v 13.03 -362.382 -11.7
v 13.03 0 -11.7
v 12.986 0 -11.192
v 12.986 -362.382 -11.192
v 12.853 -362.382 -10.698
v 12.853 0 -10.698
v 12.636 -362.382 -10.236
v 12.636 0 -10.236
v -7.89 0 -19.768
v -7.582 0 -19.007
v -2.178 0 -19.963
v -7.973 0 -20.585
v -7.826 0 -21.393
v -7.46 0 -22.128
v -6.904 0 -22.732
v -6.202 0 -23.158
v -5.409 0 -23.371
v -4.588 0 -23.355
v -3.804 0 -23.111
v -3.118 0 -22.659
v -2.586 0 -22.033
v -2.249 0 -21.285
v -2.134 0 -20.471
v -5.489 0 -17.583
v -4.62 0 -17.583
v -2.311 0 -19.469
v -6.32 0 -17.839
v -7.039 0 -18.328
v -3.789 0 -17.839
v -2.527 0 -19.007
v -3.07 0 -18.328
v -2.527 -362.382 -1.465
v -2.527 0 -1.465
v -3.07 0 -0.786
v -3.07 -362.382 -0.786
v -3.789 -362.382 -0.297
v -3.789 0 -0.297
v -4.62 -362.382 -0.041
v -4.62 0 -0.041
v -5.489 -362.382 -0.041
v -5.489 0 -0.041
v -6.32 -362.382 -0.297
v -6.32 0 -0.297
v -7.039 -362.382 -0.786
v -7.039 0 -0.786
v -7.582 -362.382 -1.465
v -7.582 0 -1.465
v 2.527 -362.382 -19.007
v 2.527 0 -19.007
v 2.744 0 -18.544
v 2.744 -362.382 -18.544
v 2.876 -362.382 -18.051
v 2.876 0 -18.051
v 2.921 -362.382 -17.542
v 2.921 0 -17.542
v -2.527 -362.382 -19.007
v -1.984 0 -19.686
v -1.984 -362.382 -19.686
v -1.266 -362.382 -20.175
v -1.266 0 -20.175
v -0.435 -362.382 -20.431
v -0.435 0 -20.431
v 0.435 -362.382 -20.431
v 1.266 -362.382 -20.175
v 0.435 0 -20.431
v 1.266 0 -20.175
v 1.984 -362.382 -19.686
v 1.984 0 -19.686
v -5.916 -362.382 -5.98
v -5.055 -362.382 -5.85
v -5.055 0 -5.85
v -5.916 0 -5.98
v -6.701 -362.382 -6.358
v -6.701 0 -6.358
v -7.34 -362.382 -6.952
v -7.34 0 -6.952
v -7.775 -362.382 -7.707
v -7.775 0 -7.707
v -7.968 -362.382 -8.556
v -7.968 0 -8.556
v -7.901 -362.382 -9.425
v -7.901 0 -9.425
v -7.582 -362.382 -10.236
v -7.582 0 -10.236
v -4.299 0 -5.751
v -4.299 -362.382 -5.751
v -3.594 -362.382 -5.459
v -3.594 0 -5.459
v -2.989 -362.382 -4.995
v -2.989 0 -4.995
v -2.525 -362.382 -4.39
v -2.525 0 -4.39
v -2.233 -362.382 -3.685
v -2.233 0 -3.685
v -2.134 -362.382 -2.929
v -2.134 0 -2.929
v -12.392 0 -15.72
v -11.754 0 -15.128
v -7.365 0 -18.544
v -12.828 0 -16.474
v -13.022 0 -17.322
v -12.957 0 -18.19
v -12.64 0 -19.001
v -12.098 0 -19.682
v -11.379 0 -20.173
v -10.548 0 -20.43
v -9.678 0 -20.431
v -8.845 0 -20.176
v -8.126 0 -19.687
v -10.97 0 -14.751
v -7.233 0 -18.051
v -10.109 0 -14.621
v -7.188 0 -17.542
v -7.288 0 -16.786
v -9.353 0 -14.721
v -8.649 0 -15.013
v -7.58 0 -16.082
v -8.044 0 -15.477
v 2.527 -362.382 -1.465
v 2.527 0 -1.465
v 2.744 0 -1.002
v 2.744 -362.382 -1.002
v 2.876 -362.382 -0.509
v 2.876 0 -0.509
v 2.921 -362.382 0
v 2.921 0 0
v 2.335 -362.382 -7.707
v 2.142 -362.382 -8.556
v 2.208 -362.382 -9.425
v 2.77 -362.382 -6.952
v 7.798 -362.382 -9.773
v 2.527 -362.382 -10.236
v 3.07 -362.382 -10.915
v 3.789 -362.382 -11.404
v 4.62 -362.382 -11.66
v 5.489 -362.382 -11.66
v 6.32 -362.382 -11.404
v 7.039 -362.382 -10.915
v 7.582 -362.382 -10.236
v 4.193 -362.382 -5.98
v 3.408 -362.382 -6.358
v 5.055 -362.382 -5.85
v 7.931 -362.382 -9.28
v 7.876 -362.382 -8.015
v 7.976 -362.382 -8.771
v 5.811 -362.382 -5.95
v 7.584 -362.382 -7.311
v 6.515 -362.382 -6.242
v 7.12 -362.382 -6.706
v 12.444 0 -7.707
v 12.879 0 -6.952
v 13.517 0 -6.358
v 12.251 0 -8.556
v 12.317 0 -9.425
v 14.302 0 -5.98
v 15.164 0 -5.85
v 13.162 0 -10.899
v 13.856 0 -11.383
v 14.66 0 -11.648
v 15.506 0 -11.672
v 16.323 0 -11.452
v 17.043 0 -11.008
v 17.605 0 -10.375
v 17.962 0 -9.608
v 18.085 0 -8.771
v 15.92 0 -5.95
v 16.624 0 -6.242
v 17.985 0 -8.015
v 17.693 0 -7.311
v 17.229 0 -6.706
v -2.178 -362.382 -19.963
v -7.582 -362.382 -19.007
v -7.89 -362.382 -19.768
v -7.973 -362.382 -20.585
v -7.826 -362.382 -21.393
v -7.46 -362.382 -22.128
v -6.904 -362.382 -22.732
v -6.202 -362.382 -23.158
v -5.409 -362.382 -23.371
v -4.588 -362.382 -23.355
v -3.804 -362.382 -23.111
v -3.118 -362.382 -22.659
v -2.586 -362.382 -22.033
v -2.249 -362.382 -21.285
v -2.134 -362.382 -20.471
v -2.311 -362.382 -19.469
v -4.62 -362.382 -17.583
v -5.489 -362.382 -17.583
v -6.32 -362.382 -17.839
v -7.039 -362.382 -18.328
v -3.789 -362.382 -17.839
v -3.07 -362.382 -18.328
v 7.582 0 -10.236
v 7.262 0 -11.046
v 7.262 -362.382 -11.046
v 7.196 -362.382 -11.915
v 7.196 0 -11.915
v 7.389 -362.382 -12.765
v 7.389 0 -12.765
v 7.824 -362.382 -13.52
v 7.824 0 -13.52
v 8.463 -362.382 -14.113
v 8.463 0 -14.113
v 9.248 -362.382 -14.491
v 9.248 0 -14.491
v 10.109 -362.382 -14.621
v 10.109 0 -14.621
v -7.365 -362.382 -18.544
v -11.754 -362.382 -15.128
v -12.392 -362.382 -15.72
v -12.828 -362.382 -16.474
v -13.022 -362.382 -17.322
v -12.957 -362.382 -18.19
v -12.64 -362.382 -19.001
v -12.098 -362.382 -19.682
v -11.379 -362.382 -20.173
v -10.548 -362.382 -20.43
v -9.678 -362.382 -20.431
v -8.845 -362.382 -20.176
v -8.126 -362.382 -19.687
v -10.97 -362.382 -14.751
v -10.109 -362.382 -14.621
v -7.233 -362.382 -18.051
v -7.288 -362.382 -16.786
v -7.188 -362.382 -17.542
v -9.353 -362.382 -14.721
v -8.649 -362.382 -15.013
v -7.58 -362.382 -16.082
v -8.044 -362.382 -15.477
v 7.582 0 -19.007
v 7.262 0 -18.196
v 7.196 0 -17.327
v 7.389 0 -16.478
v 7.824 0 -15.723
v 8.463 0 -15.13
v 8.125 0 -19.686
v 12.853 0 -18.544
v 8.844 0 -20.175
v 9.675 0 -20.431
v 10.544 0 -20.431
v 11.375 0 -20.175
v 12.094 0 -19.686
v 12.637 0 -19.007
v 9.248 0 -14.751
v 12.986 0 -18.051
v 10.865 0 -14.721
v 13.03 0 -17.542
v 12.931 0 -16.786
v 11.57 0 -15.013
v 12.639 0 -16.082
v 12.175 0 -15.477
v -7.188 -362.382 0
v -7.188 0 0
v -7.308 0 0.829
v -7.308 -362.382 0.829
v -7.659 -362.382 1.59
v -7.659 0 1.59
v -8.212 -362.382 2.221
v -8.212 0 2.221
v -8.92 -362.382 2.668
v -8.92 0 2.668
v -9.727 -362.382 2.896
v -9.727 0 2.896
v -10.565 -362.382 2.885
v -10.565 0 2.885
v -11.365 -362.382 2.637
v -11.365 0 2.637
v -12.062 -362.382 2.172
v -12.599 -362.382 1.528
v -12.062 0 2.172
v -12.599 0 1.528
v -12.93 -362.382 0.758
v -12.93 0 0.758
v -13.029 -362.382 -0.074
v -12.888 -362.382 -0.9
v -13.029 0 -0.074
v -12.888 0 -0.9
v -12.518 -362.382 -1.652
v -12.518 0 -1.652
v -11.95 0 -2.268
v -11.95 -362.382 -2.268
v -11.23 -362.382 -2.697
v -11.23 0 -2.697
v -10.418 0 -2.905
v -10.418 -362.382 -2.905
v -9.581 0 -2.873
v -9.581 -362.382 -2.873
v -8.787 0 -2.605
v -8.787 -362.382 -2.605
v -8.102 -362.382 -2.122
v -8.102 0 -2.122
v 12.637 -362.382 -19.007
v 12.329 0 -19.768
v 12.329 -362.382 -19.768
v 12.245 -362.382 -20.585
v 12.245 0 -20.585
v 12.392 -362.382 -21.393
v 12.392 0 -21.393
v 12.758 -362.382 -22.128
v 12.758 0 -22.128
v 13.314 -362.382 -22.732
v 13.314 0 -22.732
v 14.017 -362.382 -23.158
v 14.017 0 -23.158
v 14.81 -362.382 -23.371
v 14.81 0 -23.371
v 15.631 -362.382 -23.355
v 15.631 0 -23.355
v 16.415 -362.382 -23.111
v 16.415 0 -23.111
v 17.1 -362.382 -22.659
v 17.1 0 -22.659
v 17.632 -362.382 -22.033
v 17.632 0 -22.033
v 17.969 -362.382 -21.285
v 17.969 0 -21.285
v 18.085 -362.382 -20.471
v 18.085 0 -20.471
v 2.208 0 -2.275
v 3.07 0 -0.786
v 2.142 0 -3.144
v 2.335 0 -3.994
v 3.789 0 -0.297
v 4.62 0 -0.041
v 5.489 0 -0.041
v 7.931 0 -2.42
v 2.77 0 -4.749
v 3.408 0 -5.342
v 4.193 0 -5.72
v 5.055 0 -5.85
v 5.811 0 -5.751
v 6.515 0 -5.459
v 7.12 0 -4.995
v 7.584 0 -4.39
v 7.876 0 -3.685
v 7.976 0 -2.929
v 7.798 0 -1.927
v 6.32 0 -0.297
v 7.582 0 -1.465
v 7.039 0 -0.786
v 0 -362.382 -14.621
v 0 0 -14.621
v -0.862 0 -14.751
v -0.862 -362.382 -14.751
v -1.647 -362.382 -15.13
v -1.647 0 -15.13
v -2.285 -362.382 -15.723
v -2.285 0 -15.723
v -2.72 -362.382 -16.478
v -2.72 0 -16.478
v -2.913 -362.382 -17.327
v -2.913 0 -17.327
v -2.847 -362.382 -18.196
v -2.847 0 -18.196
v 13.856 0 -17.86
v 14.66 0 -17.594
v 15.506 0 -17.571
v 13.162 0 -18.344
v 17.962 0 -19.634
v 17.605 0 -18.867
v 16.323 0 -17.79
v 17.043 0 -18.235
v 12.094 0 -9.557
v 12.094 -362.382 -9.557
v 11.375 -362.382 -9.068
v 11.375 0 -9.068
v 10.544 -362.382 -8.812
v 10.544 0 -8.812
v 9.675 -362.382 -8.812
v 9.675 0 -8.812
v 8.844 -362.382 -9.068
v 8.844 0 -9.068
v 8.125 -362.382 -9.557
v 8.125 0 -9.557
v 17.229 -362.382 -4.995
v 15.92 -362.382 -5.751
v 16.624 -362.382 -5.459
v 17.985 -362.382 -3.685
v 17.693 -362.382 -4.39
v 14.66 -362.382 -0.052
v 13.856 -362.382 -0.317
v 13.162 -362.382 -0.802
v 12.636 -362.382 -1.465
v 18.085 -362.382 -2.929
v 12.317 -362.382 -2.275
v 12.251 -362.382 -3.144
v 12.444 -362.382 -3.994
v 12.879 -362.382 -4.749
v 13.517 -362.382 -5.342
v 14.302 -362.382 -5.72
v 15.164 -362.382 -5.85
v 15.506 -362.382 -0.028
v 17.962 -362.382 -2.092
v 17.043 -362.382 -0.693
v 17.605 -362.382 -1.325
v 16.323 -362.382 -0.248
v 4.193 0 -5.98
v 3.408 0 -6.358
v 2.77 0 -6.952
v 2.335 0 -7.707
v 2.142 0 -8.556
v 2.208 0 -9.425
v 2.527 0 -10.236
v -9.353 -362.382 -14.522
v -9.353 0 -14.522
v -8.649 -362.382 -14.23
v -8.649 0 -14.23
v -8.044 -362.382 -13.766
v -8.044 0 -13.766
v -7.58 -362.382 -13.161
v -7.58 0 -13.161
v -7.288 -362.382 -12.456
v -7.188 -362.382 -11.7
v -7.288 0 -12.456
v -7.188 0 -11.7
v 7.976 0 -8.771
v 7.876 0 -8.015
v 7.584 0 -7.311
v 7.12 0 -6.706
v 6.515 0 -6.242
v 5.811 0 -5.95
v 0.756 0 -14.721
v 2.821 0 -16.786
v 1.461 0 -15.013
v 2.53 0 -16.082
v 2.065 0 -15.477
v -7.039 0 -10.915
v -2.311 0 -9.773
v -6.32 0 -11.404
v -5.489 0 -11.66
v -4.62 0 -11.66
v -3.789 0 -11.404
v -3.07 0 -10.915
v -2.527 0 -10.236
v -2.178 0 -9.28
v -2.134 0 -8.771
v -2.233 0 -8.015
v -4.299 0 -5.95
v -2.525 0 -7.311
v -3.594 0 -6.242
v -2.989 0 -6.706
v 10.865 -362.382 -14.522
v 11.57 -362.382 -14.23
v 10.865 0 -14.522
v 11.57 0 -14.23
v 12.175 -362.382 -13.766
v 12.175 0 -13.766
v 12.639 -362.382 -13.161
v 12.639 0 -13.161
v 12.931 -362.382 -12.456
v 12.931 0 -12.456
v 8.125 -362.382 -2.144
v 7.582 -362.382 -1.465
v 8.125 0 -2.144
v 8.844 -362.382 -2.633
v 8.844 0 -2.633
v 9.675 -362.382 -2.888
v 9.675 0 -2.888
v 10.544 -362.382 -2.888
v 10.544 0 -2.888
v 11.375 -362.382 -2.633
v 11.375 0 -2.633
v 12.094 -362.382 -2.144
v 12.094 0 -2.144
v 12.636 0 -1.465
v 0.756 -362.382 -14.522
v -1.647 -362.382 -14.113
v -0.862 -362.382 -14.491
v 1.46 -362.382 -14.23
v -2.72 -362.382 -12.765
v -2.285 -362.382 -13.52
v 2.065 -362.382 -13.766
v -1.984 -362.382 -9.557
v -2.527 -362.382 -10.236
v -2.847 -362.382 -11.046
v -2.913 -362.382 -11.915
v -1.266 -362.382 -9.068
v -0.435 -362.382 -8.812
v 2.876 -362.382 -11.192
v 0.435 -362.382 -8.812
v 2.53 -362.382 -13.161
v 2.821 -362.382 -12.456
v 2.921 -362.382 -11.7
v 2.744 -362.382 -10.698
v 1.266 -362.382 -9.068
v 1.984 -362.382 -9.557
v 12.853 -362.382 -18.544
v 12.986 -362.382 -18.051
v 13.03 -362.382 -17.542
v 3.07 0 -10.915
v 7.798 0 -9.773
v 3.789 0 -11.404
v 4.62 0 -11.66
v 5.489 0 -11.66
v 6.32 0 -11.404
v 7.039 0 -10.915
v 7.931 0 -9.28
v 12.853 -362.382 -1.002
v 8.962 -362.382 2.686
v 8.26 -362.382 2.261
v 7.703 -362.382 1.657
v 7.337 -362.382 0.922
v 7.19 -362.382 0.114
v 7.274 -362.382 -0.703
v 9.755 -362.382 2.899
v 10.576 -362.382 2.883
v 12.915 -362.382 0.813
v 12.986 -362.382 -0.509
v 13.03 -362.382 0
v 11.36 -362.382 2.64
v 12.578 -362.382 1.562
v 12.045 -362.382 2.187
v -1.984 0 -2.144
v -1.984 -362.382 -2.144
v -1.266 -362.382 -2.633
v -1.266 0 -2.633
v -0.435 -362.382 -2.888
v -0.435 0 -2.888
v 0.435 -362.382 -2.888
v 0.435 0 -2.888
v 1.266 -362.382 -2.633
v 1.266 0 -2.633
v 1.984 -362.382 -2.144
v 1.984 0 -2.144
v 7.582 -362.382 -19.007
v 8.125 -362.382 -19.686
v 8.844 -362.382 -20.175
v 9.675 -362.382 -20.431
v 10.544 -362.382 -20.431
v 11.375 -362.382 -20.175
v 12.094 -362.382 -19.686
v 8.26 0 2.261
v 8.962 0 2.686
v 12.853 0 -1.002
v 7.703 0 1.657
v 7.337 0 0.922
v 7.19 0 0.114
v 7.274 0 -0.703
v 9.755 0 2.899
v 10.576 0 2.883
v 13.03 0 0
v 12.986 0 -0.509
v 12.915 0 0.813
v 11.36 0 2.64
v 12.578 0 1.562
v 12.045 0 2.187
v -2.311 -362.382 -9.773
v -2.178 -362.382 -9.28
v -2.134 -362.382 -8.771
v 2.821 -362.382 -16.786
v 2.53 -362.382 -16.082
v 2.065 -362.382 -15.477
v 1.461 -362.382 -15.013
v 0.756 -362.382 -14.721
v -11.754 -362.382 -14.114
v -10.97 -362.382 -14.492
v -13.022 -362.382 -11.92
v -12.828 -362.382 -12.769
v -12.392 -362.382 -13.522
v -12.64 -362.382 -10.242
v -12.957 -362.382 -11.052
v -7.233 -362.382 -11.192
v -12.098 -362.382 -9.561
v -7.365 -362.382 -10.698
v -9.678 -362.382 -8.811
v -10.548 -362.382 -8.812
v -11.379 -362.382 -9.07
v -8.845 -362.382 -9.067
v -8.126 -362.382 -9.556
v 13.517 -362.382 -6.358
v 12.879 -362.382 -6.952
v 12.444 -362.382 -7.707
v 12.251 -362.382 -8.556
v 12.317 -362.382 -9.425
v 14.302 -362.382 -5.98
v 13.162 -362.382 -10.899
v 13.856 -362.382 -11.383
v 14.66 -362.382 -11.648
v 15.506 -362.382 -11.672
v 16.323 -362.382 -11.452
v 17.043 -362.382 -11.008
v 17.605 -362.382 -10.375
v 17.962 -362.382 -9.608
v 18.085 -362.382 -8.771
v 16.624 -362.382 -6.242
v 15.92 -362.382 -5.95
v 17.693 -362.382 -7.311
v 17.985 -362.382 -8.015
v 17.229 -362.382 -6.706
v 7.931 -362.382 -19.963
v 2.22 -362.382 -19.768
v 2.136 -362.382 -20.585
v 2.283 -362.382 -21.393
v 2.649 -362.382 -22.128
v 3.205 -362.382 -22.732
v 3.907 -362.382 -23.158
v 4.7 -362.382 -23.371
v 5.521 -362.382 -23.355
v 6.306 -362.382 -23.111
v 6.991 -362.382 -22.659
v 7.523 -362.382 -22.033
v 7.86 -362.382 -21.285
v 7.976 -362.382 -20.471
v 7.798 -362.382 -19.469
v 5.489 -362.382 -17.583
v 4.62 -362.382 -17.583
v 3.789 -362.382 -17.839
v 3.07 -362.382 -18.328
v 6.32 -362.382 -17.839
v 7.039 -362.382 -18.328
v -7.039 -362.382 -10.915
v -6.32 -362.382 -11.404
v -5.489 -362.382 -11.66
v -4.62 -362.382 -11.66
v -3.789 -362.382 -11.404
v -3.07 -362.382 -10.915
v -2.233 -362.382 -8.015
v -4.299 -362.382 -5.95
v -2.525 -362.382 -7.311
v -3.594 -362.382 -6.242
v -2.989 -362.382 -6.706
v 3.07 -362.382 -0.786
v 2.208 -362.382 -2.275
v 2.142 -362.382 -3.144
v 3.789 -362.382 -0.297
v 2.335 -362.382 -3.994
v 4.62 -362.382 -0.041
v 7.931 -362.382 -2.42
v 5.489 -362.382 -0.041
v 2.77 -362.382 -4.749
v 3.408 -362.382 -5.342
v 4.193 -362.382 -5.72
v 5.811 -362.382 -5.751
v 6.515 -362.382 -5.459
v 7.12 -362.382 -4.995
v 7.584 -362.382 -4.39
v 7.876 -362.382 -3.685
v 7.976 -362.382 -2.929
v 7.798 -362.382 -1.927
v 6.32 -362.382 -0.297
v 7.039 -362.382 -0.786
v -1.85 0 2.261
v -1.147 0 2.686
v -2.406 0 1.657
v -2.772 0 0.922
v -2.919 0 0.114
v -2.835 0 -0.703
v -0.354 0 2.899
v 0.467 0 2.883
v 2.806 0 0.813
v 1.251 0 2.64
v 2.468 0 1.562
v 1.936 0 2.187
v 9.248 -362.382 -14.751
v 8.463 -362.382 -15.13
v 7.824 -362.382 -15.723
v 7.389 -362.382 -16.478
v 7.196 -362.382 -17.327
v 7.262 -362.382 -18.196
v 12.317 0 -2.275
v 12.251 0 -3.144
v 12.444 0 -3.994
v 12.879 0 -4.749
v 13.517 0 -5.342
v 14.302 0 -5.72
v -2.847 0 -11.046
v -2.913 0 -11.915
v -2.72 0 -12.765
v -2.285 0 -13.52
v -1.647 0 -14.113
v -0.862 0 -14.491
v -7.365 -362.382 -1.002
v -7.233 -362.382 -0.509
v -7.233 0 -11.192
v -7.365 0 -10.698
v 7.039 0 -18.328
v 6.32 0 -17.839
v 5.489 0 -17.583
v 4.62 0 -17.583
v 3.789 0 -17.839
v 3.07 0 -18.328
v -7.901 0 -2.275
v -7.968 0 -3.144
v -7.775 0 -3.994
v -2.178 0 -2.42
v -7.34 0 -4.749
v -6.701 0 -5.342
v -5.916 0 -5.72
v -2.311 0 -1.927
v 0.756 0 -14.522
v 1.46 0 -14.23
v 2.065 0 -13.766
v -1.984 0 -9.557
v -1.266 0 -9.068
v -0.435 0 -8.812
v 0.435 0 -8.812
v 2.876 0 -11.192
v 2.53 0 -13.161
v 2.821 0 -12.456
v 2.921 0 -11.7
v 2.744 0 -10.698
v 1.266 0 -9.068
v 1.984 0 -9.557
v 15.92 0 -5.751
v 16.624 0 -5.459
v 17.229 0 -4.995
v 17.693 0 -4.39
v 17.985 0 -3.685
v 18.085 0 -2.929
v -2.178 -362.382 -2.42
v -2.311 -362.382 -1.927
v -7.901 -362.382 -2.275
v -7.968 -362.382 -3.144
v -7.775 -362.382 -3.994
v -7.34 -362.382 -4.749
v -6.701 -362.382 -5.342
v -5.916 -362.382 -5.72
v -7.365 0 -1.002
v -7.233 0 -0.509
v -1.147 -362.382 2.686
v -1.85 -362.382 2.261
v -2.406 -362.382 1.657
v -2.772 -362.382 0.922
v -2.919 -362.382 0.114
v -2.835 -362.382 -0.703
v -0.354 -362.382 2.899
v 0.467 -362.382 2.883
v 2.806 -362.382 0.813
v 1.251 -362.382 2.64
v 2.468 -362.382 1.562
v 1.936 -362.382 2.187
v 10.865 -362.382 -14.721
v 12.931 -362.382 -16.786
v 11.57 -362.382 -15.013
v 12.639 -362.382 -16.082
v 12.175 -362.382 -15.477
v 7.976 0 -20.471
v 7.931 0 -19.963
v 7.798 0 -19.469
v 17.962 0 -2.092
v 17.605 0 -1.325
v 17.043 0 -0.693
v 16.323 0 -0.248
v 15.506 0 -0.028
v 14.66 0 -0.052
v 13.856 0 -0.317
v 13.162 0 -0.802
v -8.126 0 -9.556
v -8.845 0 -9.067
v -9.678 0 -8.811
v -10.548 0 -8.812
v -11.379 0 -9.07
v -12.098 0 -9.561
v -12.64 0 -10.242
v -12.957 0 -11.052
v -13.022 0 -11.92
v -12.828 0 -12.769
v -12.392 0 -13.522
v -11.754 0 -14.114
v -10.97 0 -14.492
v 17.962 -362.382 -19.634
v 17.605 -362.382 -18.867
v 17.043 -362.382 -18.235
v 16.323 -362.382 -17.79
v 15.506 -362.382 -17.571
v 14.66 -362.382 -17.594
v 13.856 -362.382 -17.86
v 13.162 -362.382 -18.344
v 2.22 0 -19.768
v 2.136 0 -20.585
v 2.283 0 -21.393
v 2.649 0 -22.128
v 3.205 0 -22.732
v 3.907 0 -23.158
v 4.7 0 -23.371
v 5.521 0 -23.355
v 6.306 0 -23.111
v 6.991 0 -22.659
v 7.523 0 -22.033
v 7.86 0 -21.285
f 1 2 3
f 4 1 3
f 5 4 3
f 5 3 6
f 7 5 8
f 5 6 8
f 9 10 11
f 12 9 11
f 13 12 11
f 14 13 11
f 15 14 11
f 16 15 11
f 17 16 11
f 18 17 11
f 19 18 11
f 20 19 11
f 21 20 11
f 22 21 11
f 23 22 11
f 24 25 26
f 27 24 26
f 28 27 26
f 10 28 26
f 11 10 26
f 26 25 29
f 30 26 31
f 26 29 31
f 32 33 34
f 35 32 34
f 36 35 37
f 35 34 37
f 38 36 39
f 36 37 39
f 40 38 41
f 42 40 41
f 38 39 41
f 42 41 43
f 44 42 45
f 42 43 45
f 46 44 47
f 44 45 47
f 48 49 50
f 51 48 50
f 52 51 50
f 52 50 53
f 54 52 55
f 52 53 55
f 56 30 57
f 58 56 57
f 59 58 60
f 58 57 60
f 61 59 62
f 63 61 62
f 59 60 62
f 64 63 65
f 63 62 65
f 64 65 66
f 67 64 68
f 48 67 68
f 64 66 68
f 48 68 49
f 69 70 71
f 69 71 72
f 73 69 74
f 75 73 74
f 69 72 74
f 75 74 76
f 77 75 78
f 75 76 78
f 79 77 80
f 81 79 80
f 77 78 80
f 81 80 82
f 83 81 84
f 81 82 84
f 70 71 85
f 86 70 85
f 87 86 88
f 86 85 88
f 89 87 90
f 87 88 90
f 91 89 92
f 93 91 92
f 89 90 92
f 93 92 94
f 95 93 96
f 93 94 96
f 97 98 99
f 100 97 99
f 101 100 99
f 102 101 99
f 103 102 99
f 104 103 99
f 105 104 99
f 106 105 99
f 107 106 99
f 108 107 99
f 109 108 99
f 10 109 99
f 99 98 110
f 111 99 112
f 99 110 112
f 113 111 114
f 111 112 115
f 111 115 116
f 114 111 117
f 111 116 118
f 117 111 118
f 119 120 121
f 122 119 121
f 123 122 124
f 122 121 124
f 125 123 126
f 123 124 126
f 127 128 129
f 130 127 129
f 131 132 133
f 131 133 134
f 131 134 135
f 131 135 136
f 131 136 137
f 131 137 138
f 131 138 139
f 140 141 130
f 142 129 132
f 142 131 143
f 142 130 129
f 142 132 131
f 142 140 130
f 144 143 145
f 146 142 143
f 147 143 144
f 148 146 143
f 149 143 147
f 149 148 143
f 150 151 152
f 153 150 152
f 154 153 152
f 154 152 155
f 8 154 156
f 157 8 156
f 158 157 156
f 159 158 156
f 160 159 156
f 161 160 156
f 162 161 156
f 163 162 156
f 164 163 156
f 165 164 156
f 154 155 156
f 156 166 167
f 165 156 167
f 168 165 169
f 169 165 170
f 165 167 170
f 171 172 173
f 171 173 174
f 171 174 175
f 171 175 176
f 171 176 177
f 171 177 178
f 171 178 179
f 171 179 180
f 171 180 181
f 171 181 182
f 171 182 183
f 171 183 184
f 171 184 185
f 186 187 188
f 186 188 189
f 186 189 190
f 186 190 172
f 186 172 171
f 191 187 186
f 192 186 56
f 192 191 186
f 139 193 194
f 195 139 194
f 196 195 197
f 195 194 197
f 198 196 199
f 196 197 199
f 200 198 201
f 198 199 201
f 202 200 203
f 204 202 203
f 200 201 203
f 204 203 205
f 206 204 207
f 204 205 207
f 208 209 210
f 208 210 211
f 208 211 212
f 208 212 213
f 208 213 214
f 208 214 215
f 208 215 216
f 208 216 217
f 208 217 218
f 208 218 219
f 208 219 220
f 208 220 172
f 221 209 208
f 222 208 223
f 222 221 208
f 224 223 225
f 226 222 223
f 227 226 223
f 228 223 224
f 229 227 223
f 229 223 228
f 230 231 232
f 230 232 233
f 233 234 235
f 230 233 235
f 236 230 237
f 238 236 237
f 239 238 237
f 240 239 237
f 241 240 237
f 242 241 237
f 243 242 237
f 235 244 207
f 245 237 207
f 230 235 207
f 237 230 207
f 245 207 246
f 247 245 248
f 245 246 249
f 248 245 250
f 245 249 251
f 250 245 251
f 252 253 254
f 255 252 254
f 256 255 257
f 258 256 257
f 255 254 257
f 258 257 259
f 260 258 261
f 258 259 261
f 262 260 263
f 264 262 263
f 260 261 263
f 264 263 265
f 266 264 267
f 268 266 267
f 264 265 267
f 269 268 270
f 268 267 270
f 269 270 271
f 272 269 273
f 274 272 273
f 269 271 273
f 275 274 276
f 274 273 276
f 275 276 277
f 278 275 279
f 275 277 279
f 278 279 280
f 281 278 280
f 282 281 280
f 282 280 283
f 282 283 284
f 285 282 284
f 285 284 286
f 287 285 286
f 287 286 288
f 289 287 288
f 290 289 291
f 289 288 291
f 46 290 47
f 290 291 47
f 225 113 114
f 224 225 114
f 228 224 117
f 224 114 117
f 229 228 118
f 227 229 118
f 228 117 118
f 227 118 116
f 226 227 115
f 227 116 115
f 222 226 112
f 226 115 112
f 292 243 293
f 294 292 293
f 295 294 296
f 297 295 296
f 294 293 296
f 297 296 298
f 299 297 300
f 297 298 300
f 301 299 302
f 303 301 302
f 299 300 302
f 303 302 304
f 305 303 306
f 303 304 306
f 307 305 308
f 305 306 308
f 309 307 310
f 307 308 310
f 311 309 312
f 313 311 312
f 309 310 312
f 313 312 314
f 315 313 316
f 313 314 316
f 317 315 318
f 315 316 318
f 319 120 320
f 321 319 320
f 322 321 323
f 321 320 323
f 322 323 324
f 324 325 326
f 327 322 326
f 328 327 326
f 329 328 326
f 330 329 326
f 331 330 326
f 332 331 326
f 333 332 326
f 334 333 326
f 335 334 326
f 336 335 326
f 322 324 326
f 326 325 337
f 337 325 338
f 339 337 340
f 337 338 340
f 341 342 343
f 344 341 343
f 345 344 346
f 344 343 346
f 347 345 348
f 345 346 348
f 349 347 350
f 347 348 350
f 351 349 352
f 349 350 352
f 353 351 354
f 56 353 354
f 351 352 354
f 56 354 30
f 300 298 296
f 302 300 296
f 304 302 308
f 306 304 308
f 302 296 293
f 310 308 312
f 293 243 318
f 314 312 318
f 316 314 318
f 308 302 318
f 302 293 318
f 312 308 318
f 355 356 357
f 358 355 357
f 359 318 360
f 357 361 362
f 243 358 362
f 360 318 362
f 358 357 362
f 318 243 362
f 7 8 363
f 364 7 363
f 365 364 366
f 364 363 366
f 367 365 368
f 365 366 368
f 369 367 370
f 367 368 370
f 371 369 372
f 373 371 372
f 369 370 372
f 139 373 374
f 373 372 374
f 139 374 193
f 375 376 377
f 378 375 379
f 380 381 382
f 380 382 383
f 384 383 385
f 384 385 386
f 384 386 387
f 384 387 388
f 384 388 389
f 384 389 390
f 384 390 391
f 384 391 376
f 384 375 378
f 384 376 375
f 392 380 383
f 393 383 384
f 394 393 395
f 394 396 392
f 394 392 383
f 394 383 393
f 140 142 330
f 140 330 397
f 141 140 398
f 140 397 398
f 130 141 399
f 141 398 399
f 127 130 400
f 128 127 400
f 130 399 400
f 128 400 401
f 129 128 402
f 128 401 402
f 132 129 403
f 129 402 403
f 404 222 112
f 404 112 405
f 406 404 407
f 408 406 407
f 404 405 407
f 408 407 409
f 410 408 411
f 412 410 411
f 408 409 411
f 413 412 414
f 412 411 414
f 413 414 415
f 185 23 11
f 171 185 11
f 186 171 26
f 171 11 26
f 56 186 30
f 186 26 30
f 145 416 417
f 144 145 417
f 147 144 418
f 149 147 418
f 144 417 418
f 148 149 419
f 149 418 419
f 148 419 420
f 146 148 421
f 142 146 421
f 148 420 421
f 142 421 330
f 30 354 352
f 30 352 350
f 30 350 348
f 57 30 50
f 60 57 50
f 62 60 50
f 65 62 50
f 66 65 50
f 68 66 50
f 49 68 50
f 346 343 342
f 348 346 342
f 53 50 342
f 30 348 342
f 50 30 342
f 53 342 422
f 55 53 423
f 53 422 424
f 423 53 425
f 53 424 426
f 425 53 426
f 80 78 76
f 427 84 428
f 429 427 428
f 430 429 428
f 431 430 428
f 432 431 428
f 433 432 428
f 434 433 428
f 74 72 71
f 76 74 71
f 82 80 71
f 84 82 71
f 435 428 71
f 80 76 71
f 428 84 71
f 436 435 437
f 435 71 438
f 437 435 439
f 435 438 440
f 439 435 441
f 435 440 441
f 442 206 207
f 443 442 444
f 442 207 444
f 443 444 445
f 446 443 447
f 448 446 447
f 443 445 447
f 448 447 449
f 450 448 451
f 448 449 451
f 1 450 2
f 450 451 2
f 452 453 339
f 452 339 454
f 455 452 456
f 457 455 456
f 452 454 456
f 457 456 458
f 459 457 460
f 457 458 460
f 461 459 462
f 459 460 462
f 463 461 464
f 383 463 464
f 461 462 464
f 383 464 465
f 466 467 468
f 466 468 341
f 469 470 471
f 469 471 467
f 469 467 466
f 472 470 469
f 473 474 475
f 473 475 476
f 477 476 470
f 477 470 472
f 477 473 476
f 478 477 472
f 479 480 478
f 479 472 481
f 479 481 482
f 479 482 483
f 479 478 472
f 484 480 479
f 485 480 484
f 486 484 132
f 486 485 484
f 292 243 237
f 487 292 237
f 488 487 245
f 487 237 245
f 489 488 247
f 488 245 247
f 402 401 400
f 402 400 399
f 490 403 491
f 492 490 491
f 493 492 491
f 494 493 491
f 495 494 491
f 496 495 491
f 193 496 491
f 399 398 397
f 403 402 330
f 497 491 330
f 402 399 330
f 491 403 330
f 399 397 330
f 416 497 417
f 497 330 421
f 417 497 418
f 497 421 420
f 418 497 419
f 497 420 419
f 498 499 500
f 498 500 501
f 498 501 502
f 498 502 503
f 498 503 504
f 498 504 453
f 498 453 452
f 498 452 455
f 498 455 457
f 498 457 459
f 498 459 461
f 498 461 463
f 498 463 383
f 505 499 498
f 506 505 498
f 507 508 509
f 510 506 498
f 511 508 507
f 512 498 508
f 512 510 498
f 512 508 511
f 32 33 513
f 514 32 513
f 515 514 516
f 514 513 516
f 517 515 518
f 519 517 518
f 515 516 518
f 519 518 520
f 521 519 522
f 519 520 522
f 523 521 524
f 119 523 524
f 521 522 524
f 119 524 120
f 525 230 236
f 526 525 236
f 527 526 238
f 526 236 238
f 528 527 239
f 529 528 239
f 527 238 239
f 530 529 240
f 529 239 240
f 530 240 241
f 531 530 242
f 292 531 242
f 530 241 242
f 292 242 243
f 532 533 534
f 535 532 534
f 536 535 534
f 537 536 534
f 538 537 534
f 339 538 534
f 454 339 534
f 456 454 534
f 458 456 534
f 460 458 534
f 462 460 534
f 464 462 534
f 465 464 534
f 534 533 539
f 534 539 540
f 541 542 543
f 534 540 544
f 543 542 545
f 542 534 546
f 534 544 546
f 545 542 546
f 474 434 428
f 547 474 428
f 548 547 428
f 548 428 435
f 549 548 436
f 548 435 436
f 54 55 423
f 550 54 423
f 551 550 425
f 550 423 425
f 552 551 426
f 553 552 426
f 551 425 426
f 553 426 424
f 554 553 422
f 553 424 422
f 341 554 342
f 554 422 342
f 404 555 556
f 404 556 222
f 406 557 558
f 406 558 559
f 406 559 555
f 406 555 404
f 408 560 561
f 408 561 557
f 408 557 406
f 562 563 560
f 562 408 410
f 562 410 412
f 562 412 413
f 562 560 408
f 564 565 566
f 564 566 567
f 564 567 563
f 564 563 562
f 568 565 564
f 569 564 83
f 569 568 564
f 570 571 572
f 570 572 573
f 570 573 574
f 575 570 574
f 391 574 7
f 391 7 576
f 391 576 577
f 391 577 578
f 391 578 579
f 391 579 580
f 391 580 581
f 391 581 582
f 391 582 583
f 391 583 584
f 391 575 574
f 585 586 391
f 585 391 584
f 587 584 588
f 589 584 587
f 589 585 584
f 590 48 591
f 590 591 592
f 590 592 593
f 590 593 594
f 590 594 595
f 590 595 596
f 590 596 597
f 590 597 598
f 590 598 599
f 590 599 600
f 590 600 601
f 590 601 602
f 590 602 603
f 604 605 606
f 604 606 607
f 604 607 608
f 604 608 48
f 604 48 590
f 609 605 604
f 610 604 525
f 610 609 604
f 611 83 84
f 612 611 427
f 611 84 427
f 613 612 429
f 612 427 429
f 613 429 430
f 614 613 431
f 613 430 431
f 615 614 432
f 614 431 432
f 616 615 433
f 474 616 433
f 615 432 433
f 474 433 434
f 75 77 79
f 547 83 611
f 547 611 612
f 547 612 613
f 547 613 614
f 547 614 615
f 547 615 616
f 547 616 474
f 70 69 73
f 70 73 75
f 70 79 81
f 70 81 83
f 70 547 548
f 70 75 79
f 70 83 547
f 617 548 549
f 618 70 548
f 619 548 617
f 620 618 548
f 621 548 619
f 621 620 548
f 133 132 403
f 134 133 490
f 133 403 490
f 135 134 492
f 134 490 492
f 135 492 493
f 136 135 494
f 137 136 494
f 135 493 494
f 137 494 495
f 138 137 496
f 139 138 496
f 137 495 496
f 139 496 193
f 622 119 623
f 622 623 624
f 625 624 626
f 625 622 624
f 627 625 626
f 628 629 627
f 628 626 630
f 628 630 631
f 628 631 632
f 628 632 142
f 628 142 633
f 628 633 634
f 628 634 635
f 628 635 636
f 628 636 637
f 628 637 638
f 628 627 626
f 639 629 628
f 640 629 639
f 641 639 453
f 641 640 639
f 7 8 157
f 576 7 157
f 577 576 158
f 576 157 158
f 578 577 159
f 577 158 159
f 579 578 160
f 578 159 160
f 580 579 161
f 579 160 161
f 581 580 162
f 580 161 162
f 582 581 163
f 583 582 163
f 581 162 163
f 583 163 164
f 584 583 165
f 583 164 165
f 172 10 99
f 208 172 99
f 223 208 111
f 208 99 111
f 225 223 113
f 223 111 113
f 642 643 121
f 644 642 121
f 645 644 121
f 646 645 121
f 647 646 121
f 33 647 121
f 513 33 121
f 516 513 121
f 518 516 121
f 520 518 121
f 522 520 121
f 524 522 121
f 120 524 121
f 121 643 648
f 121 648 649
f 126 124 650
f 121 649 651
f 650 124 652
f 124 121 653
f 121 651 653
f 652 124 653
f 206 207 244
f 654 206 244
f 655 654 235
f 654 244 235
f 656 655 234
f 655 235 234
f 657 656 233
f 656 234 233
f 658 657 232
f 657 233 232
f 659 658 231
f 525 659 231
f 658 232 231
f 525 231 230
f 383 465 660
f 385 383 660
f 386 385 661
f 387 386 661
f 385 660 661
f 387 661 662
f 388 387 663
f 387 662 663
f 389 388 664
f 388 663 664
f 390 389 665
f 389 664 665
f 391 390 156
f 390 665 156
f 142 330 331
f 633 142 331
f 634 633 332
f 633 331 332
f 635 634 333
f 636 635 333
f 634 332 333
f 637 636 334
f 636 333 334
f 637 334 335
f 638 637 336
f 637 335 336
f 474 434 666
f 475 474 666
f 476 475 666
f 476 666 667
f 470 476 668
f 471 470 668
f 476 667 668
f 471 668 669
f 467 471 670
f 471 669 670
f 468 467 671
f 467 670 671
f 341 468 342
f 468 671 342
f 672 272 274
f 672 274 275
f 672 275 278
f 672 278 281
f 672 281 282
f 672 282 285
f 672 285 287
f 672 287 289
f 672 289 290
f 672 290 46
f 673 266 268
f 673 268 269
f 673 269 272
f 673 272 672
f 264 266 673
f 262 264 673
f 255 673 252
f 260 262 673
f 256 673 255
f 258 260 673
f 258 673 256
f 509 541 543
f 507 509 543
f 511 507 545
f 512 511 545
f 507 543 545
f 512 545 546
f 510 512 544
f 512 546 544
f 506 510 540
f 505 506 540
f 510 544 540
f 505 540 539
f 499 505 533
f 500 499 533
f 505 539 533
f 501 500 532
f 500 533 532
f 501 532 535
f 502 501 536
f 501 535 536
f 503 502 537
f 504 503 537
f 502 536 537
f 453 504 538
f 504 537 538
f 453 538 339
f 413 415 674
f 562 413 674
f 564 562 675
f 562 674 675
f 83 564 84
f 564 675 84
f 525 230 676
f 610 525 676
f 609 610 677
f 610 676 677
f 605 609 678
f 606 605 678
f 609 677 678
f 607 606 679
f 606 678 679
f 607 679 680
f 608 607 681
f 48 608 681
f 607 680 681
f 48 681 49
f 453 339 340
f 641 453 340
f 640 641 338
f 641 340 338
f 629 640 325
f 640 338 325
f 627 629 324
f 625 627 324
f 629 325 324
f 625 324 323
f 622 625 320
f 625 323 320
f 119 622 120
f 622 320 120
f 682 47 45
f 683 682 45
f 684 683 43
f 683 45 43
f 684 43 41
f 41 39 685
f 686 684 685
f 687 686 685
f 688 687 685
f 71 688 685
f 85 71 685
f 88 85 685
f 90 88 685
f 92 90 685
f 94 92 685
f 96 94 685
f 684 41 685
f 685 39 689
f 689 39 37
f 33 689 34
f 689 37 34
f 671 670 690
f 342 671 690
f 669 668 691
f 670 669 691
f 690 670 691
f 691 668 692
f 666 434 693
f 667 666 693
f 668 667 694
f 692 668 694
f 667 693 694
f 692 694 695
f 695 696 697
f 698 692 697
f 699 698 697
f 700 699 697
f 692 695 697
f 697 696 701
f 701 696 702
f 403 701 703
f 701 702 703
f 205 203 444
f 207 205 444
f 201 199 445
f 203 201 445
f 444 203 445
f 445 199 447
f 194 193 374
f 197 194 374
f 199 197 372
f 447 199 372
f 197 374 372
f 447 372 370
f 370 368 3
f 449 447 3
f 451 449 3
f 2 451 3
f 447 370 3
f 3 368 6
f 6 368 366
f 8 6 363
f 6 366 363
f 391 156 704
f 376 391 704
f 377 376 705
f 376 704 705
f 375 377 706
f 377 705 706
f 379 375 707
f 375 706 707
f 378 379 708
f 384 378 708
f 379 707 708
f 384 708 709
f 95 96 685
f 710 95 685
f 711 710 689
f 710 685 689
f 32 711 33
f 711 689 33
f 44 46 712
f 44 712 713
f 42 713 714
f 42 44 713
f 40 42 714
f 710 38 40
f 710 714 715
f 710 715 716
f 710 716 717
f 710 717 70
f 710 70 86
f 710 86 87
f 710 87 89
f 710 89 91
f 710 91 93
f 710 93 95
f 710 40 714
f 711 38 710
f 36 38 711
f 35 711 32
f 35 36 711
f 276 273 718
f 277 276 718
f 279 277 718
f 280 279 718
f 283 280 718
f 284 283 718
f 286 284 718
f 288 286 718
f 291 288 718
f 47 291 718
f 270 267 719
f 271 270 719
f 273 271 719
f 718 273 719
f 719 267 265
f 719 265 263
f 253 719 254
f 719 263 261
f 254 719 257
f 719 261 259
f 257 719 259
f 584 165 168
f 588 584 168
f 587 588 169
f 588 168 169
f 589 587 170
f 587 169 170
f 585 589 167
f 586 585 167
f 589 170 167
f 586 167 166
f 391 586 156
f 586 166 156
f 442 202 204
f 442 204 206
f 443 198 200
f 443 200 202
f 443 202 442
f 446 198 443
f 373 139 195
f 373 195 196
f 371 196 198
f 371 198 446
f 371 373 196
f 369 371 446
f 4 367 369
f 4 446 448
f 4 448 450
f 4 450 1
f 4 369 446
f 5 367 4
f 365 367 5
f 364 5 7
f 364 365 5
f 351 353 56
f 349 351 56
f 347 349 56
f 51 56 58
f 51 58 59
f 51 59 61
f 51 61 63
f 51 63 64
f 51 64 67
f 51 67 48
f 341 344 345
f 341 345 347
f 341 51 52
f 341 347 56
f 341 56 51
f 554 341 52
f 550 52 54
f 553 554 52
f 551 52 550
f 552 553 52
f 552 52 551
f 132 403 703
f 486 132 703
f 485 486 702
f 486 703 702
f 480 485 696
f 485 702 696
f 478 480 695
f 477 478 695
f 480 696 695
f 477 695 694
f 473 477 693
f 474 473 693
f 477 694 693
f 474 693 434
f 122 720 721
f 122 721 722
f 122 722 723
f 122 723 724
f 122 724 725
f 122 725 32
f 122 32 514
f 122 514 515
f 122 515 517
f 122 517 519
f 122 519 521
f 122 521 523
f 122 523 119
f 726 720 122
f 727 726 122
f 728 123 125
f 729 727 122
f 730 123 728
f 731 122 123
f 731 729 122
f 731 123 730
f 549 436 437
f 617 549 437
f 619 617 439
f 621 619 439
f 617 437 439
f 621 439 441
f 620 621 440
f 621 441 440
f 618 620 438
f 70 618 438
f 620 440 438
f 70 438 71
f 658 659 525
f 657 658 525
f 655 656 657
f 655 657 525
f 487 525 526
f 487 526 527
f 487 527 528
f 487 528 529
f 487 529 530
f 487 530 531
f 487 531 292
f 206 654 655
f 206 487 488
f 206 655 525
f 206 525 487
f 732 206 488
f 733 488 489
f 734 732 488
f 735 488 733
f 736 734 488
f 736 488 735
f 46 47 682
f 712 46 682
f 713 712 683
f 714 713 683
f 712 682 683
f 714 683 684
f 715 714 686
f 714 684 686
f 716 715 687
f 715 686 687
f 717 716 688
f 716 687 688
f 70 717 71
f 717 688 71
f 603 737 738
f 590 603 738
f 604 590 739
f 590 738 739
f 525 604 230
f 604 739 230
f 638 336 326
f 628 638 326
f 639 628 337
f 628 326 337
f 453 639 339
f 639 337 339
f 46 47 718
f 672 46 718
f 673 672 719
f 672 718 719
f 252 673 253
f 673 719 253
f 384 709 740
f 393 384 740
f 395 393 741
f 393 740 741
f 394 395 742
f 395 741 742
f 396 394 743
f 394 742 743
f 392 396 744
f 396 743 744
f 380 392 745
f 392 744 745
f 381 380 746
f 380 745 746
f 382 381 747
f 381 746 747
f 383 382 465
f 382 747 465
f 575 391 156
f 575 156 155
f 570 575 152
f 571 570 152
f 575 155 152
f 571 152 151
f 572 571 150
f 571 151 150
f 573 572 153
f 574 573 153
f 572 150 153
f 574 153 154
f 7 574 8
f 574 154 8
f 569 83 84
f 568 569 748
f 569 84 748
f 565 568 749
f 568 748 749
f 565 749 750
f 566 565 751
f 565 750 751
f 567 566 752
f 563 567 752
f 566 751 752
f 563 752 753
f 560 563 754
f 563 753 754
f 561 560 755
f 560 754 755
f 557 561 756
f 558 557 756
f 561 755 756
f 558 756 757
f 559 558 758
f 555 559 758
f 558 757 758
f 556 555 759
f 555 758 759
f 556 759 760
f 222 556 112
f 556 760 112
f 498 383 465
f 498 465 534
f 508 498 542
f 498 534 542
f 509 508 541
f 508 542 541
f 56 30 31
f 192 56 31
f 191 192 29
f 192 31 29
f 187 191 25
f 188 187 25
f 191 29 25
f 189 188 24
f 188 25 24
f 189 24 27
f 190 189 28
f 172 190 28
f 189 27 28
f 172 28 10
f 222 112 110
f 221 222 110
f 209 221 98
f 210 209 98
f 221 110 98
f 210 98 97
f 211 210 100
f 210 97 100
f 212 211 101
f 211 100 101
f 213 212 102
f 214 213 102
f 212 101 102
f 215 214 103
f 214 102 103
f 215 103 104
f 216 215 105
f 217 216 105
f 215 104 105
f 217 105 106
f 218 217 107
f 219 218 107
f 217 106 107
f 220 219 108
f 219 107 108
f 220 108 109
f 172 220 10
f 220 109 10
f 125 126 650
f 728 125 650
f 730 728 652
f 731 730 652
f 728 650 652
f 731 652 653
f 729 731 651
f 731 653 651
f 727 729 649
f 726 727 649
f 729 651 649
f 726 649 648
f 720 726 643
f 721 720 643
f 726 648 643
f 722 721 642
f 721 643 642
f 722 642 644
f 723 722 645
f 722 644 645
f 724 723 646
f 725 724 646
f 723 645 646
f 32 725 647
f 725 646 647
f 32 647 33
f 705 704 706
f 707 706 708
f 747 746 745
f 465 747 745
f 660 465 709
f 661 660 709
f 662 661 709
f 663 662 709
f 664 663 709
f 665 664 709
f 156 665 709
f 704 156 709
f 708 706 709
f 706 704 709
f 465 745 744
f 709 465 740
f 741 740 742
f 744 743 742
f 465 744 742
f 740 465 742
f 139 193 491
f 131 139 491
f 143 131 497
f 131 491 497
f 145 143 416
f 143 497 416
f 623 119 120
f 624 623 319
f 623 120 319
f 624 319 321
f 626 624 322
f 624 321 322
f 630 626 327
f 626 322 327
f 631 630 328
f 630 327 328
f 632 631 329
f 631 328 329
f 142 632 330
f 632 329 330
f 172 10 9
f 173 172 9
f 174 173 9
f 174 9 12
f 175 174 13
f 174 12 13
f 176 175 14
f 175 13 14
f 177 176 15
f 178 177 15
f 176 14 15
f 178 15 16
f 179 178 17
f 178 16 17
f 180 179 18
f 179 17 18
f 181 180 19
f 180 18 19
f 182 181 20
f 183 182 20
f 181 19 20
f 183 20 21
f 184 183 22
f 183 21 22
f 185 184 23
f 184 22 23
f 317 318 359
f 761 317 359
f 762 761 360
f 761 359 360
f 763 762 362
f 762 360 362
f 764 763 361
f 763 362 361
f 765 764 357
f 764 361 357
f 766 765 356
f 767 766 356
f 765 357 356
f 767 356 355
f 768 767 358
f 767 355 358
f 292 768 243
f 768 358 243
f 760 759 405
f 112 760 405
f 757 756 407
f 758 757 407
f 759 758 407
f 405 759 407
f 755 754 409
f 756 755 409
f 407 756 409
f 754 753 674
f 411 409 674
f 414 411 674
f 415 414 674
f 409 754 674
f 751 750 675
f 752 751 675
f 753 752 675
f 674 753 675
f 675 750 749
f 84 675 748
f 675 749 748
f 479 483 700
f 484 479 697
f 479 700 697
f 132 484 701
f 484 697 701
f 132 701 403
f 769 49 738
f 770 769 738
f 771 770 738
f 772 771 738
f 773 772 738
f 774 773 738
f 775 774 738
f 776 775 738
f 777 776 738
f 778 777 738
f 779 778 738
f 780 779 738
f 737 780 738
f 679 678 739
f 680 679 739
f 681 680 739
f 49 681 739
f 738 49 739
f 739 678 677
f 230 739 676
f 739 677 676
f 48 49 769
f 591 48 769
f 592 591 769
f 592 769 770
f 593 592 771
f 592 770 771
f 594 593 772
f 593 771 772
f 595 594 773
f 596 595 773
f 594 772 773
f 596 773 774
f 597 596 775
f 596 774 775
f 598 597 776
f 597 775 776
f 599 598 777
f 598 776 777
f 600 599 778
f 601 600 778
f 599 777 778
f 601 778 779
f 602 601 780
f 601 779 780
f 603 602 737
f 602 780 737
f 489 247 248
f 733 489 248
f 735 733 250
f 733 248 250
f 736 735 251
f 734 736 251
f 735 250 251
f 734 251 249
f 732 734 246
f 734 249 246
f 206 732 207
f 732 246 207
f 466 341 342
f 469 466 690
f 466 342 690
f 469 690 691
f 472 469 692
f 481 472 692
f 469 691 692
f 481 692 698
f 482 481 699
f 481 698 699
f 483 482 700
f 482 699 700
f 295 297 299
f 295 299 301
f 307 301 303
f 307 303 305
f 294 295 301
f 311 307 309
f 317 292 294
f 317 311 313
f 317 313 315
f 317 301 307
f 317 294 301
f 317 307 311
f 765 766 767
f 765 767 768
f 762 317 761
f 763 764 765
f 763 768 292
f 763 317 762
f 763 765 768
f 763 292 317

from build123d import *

# Parameters (mm, degrees)
F1_DEPTH = 362.3818


with BuildPart() as f1:
    # F0 (on Front) → F1 (new body)
    with BuildSketch(Plane.XZ):
        with BuildLine():
            ThreePointArc((7.9756, -8.771161), (7.120059, -6.705702), (5.0546, -5.850161))
            ThreePointArc((5.0546, -5.850161), (2.523762, -7.312702), (2.5273, -10.235741))
            ThreePointArc((2.5273, -10.235741), (5.0546, -11.692161), (7.5819, -10.235741))
            ThreePointArc((7.5819, -10.235741), (7.875458, -9.529448), (7.9756, -8.771161))
        make_face()
        with BuildLine():
            ThreePointArc((12.6365, -10.235741), (10.1092, -8.779322), (7.5819, -10.235741))
            ThreePointArc((7.5819, -10.235741), (7.578362, -13.15878), (10.1092, -14.621322))
            ThreePointArc((10.1092, -14.621322), (12.174659, -13.76578), (13.0302, -11.700322))
            ThreePointArc((13.0302, -11.700322), (12.930058, -10.942035), (12.6365, -10.235741))
        make_face()
        with BuildLine():
            ThreePointArc((-2.1336, -8.771161), (-2.989141, -6.705702), (-5.0546, -5.850161))
            ThreePointArc((-5.0546, -5.850161), (-7.585438, -7.312702), (-7.5819, -10.235741))
            ThreePointArc((-7.5819, -10.235741), (-5.0546, -11.692161), (-2.5273, -10.235741))
            ThreePointArc((-2.5273, -10.235741), (-2.233742, -9.529448), (-2.1336, -8.771161))
        make_face()
        with BuildLine():
            ThreePointArc((7.9756, -20.471482), (7.875458, -19.713196), (7.5819, -19.006902))
            ThreePointArc((7.5819, -19.006902), (5.0546, -17.550482), (2.5273, -19.006902))
            ThreePointArc((2.5273, -19.006902), (4.296313, -23.292341), (7.9756, -20.471482))
        make_face()
        with BuildLine():
            ThreePointArc((-7.1882, -11.700322), (-7.288342, -10.942035), (-7.5819, -10.235741))
            ThreePointArc((-7.5819, -10.235741), (-12.640038, -10.241863), (-10.1092, -14.621322))
            ThreePointArc((-10.1092, -14.621322), (-8.043741, -13.76578), (-7.1882, -11.700322))
        make_face()
        with BuildLine():
            ThreePointArc((-2.5273, -19.006902), (-5.0546, -17.550482), (-7.5819, -19.006902))
            ThreePointArc((-7.5819, -19.006902), (-5.812887, -23.292341), (-2.1336, -20.471482))
            ThreePointArc((-2.1336, -20.471482), (-2.233742, -19.713196), (-2.5273, -19.006902))
        make_face()
        with BuildLine():
            ThreePointArc((2.921, -17.542322), (2.065459, -15.476863), (0, -14.621322))
            ThreePointArc((0, -14.621322), (-2.530838, -16.083863), (-2.5273, -19.006902))
            ThreePointArc((-2.5273, -19.006902), (0, -20.463322), (2.5273, -19.006902))
            ThreePointArc((2.5273, -19.006902), (2.820858, -18.300608), (2.921, -17.542322))
        make_face()
        with BuildLine():
            ThreePointArc((18.0848, -20.471482), (15.922087, -17.650624), (12.6365, -19.006902))
            ThreePointArc((12.6365, -19.006902), (14.405513, -23.292341), (18.0848, -20.471482))
        make_face()
        with BuildLine():
            ThreePointArc((-7.1882, -17.542322), (-8.043741, -15.476863), (-10.1092, -14.621322))
            ThreePointArc((-10.1092, -14.621322), (-12.640038, -19.00078), (-7.5819, -19.006902))
            ThreePointArc((-7.5819, -19.006902), (-7.288342, -18.300608), (-7.1882, -17.542322))
        make_face()
        with BuildLine():
            ThreePointArc((-2.1336, -2.929161), (-2.233742, -2.170874), (-2.5273, -1.46458))
            ThreePointArc((-2.5273, -1.46458), (-5.0546, -0.008161), (-7.5819, -1.46458))
            ThreePointArc((-7.5819, -1.46458), (-7.585438, -4.387619), (-5.0546, -5.850161))
            ThreePointArc((-5.0546, -5.850161), (-2.989141, -4.99462), (-2.1336, -2.929161))
        make_face()
        with BuildLine():
            ThreePointArc((7.5819, -1.46458), (5.0546, -0.008161), (2.5273, -1.46458))
            ThreePointArc((2.5273, -1.46458), (2.523762, -4.387619), (5.0546, -5.850161))
            ThreePointArc((5.0546, -5.850161), (7.120059, -4.99462), (7.9756, -2.929161))
            ThreePointArc((7.9756, -2.929161), (7.875458, -2.170874), (7.5819, -1.46458))
        make_face()
        with BuildLine():
            ThreePointArc((2.921, -11.700322), (2.820858, -10.942035), (2.5273, -10.235741))
            ThreePointArc((2.5273, -10.235741), (0, -8.779322), (-2.5273, -10.235741))
            ThreePointArc((-2.5273, -10.235741), (-2.530838, -13.15878), (0, -14.621322))
            ThreePointArc((0, -14.621322), (2.065459, -13.76578), (2.921, -11.700322))
        make_face()
        with BuildLine():
            ThreePointArc((18.0848, -2.929161), (15.922087, -0.108302), (12.6365, -1.46458))
            ThreePointArc((12.6365, -1.46458), (12.632962, -4.387619), (15.1638, -5.850161))
            ThreePointArc((15.1638, -5.850161), (17.229259, -4.99462), (18.0848, -2.929161))
        make_face()
        with BuildLine():
            ThreePointArc((13.0302, -17.542322), (12.174659, -15.476863), (10.1092, -14.621322))
            ThreePointArc((10.1092, -14.621322), (7.578362, -16.083863), (7.5819, -19.006902))
            ThreePointArc((7.5819, -19.006902), (10.1092, -20.463322), (12.6365, -19.006902))
            ThreePointArc((12.6365, -19.006902), (12.930058, -18.300608), (13.0302, -17.542322))
        make_face()
        with BuildLine():
            ThreePointArc((18.0848, -8.771161), (17.229259, -6.705702), (15.1638, -5.850161))
            ThreePointArc((15.1638, -5.850161), (12.632962, -7.312702), (12.6365, -10.235741))
            ThreePointArc((12.6365, -10.235741), (15.922087, -11.592019), (18.0848, -8.771161))
        make_face()
        with BuildLine():
            ThreePointArc((-7.1882, 0), (-12.930058, 0.758287), (-7.5819, -1.46458))
            ThreePointArc((-7.5819, -1.46458), (-7.288342, -0.758287), (-7.1882, 0))
        make_face()
        with BuildLine():
            ThreePointArc((2.5273, -1.46458), (2.820858, -0.758287), (2.921, 0))
            ThreePointArc((2.921, 0), (-0.758287, 2.820858), (-2.5273, -1.46458))
            ThreePointArc((-2.5273, -1.46458), (0, -2.921), (2.5273, -1.46458))
        make_face()
        with BuildLine():
            ThreePointArc((13.0302, 0), (9.350913, 2.820858), (7.5819, -1.46458))
            ThreePointArc((7.5819, -1.46458), (10.1092, -2.921), (12.6365, -1.46458))
            ThreePointArc((12.6365, -1.46458), (12.930058, -0.758287), (13.0302, 0))
        make_face()
    extrude(amount=F1_DEPTH)


solid = f1.part
